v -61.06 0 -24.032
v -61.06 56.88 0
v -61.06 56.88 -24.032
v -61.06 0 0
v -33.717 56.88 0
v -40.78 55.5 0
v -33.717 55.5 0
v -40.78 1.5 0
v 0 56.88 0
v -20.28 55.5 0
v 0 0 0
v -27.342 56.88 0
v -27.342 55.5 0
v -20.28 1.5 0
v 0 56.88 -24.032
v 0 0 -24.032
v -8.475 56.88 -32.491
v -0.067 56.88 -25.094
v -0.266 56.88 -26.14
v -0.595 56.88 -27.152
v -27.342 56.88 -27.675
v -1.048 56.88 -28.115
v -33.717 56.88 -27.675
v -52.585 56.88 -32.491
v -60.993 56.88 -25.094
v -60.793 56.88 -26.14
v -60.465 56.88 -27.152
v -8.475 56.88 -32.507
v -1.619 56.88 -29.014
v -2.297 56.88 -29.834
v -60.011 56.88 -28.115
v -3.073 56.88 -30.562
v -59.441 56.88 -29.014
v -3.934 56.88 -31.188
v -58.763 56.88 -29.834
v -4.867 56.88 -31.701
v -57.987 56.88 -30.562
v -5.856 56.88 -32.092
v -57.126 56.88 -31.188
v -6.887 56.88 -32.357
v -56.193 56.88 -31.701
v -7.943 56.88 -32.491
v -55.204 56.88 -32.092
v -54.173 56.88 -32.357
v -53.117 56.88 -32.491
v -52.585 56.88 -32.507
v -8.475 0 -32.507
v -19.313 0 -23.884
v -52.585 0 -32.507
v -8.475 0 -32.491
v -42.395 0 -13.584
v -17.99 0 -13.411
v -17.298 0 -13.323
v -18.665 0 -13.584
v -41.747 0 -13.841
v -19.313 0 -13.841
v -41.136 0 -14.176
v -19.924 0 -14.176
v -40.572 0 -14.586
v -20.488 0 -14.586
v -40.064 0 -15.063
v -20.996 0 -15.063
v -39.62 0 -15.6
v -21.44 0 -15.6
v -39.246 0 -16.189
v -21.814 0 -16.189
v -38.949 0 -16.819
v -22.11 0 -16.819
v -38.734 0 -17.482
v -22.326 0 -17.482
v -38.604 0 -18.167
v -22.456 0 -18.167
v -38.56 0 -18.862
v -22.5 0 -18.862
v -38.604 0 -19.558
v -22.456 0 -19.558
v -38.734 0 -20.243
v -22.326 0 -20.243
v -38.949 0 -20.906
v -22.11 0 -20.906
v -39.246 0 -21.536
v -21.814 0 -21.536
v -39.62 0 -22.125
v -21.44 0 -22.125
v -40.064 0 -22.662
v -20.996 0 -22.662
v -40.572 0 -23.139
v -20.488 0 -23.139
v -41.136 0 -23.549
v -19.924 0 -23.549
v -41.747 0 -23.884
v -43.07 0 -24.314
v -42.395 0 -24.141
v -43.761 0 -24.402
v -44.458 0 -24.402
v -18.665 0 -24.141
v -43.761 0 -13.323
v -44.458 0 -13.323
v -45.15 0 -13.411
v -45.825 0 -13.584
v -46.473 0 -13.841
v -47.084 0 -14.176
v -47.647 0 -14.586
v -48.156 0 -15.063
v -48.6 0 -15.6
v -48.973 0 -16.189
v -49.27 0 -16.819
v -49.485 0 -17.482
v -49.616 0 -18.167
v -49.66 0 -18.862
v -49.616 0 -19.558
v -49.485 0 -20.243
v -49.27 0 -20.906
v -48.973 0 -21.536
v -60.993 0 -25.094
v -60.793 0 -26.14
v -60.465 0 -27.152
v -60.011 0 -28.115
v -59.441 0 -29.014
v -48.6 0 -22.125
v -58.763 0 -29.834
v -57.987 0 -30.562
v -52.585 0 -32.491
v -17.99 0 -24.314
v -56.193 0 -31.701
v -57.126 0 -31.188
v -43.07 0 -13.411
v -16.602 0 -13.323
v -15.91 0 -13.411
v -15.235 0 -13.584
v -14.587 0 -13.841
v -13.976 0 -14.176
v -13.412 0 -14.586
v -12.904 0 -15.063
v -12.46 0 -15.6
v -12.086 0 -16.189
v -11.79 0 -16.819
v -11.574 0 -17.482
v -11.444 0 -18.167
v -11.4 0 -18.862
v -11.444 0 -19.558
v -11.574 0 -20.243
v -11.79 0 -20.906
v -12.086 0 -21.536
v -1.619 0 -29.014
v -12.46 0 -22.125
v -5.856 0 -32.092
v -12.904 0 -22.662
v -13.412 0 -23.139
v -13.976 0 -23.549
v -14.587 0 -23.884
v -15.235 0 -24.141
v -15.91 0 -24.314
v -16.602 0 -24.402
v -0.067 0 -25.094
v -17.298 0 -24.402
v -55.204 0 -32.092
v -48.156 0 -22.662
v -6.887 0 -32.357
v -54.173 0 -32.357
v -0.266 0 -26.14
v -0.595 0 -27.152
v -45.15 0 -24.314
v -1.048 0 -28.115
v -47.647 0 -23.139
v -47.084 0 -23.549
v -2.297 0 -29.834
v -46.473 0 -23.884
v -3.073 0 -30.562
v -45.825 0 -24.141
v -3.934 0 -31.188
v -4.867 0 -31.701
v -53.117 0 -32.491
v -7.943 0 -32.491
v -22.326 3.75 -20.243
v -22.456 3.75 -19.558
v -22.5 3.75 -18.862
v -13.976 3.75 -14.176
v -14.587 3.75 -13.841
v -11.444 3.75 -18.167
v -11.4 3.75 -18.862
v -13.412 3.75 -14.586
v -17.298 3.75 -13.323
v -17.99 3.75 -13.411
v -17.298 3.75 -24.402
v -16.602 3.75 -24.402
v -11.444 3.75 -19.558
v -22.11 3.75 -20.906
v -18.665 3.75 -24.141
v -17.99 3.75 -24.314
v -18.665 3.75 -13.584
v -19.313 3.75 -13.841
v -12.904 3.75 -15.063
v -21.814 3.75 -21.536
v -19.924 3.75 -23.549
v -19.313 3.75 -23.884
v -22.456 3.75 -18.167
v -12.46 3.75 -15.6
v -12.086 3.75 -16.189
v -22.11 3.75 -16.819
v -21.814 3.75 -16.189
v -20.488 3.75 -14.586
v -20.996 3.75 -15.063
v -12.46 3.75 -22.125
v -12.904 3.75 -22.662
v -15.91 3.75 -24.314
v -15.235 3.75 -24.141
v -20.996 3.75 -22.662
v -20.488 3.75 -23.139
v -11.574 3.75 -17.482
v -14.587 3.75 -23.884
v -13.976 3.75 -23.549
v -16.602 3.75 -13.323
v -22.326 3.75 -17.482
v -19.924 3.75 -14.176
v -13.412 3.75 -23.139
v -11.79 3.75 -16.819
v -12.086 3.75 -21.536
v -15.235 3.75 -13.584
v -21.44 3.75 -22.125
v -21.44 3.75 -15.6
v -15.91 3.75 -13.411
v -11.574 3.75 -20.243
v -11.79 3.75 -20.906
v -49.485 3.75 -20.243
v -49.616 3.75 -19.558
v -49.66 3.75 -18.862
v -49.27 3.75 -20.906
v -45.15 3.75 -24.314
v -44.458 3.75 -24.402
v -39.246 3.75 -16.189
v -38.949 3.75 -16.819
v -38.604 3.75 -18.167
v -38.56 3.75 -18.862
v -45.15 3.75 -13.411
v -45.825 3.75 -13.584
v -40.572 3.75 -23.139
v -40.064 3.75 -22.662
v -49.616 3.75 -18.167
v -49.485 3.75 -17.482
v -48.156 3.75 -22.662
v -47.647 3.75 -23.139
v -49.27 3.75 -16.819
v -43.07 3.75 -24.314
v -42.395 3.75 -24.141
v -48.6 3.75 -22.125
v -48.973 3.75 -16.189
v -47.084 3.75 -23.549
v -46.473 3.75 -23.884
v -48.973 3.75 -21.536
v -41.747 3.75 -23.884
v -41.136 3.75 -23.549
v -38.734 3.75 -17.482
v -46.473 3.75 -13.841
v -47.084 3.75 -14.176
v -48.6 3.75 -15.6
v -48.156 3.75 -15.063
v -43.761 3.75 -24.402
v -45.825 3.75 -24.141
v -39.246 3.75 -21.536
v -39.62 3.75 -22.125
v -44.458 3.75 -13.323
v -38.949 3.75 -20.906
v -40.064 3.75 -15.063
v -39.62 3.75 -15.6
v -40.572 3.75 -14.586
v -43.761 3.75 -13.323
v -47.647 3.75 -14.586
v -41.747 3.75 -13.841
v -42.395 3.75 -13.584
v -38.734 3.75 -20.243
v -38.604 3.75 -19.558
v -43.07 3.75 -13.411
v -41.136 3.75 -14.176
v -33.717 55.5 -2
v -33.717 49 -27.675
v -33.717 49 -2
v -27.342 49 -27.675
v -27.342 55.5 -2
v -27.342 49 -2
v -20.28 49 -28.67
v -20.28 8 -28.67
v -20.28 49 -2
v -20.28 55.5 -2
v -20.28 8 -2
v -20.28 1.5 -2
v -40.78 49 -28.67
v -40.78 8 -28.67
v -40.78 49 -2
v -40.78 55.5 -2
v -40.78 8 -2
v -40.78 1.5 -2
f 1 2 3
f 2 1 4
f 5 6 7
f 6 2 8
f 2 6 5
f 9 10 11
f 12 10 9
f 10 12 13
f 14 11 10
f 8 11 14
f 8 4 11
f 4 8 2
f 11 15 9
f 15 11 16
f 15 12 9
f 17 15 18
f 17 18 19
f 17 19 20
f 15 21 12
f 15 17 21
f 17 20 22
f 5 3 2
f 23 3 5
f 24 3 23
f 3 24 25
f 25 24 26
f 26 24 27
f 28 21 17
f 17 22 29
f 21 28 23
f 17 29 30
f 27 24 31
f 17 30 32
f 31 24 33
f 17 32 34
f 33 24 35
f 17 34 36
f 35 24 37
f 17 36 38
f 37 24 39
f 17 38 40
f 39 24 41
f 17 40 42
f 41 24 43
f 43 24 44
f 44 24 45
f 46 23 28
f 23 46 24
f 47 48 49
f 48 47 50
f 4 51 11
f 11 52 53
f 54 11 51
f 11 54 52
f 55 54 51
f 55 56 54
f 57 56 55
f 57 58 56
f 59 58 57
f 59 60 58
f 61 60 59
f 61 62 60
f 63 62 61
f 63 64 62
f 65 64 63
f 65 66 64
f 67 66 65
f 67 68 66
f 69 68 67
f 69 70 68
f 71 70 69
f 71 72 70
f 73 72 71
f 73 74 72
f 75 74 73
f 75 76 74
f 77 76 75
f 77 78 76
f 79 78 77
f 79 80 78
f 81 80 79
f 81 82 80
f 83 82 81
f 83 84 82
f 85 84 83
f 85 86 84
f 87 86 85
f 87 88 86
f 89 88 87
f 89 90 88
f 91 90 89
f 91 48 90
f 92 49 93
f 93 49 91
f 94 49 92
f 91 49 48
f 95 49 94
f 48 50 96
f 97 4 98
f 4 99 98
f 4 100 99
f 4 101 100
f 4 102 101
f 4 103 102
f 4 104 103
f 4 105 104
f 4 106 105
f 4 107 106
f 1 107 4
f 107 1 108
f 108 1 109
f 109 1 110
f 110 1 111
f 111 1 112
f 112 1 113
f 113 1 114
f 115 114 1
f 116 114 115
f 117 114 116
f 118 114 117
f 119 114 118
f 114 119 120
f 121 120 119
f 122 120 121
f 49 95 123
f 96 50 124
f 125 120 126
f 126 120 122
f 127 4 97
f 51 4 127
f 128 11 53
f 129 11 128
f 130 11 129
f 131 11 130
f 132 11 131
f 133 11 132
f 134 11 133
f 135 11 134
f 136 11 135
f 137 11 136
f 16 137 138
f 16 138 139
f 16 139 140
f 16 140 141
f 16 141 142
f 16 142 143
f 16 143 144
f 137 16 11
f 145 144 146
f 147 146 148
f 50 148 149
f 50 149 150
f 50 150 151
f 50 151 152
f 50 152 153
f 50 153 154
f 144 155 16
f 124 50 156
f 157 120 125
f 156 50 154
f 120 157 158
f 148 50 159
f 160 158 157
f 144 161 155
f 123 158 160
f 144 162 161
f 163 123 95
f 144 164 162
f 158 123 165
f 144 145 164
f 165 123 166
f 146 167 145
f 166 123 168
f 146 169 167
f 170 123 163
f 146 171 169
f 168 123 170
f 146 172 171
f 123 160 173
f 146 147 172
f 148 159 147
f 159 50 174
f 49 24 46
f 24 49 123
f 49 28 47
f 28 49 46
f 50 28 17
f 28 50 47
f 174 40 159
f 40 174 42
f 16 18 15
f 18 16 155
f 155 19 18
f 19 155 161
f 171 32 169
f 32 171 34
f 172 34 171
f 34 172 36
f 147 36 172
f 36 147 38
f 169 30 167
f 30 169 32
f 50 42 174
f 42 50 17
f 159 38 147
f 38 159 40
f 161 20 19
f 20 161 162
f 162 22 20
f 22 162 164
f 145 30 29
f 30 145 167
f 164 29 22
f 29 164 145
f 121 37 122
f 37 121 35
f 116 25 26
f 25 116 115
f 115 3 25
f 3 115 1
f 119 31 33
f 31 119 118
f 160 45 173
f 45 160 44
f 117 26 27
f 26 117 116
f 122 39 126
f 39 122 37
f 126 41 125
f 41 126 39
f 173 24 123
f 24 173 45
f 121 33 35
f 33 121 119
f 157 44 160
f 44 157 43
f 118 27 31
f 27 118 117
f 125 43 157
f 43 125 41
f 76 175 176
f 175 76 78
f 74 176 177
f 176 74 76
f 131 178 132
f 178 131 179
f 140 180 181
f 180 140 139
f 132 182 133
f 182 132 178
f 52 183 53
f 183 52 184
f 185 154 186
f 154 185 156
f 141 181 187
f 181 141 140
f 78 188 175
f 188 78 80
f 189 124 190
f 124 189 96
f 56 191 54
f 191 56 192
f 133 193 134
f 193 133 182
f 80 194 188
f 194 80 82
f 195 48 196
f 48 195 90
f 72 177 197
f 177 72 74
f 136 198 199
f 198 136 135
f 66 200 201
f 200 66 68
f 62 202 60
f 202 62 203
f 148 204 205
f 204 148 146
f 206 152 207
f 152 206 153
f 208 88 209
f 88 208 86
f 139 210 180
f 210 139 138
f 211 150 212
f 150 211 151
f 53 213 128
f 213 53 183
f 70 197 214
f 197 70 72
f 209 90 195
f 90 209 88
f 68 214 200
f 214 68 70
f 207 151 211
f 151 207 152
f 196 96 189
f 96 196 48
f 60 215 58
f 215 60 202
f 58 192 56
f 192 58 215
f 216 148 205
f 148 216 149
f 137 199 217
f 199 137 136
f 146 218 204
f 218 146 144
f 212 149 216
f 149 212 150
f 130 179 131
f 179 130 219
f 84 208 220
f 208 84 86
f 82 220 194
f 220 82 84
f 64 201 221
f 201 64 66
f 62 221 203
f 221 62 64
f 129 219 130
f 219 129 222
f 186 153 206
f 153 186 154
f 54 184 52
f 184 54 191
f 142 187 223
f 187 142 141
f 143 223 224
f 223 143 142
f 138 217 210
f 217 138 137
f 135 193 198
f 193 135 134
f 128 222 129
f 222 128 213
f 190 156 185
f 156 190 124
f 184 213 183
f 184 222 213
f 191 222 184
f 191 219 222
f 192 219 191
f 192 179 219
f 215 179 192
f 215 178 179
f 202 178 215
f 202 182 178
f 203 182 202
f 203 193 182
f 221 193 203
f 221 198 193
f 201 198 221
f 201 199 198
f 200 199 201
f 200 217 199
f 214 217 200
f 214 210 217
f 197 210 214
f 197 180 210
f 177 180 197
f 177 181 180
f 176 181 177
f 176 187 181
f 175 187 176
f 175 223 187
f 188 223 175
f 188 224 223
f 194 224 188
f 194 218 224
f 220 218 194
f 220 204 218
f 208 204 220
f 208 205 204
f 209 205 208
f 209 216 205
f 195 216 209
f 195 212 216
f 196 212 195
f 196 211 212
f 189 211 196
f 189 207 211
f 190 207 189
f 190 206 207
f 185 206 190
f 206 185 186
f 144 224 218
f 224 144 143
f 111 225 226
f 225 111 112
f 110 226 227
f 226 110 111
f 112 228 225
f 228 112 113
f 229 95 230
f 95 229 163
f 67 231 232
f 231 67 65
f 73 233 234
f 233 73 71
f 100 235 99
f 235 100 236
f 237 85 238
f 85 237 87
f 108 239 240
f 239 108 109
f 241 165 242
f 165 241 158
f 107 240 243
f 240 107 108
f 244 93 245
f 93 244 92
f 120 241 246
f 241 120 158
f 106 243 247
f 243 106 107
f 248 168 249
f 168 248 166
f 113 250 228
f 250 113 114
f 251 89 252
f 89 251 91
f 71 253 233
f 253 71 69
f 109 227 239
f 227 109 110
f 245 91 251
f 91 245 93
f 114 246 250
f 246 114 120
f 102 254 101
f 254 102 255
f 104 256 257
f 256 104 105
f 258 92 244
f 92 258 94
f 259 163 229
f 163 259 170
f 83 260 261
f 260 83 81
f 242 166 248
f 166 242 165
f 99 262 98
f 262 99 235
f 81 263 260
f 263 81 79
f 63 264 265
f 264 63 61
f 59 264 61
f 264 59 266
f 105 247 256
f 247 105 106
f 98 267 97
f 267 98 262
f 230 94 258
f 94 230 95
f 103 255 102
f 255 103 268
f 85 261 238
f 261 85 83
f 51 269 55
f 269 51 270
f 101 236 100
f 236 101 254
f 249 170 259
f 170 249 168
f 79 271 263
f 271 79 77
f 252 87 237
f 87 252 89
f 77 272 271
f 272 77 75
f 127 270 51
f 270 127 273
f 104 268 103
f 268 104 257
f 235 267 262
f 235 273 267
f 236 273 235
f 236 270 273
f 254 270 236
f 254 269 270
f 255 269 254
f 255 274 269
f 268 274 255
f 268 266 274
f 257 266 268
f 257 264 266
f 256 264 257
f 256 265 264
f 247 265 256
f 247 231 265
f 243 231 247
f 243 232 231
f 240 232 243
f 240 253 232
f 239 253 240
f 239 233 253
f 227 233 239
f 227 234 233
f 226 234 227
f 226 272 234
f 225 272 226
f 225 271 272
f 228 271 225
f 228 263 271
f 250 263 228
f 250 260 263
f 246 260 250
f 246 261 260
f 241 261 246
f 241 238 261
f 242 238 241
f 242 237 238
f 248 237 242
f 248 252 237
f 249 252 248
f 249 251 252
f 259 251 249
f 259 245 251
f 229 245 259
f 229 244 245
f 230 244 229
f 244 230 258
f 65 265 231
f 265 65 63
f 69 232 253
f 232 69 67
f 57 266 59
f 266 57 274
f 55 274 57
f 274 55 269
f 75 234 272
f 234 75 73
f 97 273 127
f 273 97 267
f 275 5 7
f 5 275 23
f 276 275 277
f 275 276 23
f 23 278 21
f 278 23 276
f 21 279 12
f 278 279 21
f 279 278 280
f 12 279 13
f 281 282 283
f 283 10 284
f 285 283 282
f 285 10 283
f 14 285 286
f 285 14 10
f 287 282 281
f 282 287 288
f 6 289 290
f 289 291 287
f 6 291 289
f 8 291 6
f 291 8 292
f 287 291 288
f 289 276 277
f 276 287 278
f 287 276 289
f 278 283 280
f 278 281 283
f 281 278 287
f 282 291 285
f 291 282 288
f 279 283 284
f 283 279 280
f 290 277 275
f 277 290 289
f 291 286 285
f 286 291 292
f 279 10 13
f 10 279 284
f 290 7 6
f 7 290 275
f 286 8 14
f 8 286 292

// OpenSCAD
// NodeBot Head 

// License: BSD 2-Clause
/*
Copyright (c) 2013, Jason R. Huggins
All rights reserved.

Redistribution and use in source and binary forms, with or without modification, are permitted provided that the following conditions are met:

Redistributions of source code must retain the above copyright notice, this list of conditions and the following disclaimer.
Redistributions in binary form must reproduce the above copyright notice, this list of conditions and the following disclaimer in the documentation and/or other materials provided with the distribution.
THIS SOFTWARE IS PROVIDED BY THE COPYRIGHT HOLDERS AND CONTRIBUTORS "AS IS" AND ANY EXPRESS OR IMPLIED WARRANTIES, INCLUDING, BUT NOT LIMITED TO, THE IMPLIED WARRANTIES OF MERCHANTABILITY AND FITNESS FOR A PARTICULAR PURPOSE ARE DISCLAIMED. IN NO EVENT SHALL THE COPYRIGHT HOLDER OR CONTRIBUTORS BE LIABLE FOR ANY DIRECT, INDIRECT, INCIDENTAL, SPECIAL, EXEMPLARY, OR CONSEQUENTIAL DAMAGES (INCLUDING, BUT NOT LIMITED TO, PROCUREMENT OF SUBSTITUTE GOODS OR SERVICES; LOSS OF USE, DATA, OR PROFITS; OR BUSINESS INTERRUPTION) HOWEVER CAUSED AND ON ANY THEORY OF LIABILITY, WHETHER IN CONTRACT, STRICT LIABILITY, OR TORT (INCLUDING NEGLIGENCE OR OTHERWISE) ARISING IN ANY WAY OUT OF THE USE OF THIS SOFTWARE, EVEN IF ADVISED OF THE POSSIBILITY OF SUCH DAMAGE.
*/


// Measurements from: http://www.servocity.com/html/hs-311_standard.html
// Original:
//A = 19.82;
// Tweaked to allow for more clearance:
A = 20.5;
B = 13.47;
C = 33.79;
D = 10.17;
E =  9.66;
F = 30.22;
G = 11.68;
H = 26.67;
// Original:
//J = 52.84;
// Tweaked to allow for more clearance:
J = 54;
K =  9.35;
L =  4.38;
// Original:
//M = 39.88;
// Tweaked to allow for more clearance:
M = 41;
X =  3.05;

servo_width = A;
sero_depth = M;
servo_height = H+K;
head_width = 52.84+23;
head_scale = .75;

module servo() {
    union() {
        // Main housing
        cube([servo_width, sero_depth, servo_height]);
        
        // Mounting holes flange
        translate([0, -(J-sero_depth)/2, H])
        cube([servo_width, J, 2.5]);
    }
}

// Attribution: Julien Deveaux, from The Noun Project
// http://thenounproject.com/noun/robot/#icon-No6865
module nodebot_head(){
    difference(){
        scale([head_scale,head_scale,head_scale]){
            difference() {
                union() {
                    cube(size = [81.413,head_width,32.043]);
                    
                    translate([22.6/2,0,0])
                    cube(size = [81.413-22.6,head_width,32.043+22.6/2]);
                    
                    rotate([90,0,0])
                    translate([22.6/2,32.043,-head_width])
                    cylinder(h = head_width, r=22.6/2, $fn=50);
                    
                    rotate([90,0,0])
                    translate([81.413-22.6/2,32.043,-head_width])
                    cylinder(h = head_width, r=22.6/2, $fn=50);
                }
                
                rotate([90,0,0])
                translate([22.6,25.150,-5])
                cylinder(h = 10, r=14.8/2, $fn=50);
                
                rotate([90,0,0])
                translate([81.413-22.6,25.150,-5])
                cylinder(h = 10, r=14.8/2, $fn=50);
                
                translate([(81.413-8.5)/2,head_width-12,-2])
                cube(size = [8.5,16,38.9]);
            }
        }

        rotate([0,180,0])
        translate([-81.413/2*head_scale-A/2,8,-H-2])
        servo();
    }
}

rotate([0,180,0])
nodebot_head();
